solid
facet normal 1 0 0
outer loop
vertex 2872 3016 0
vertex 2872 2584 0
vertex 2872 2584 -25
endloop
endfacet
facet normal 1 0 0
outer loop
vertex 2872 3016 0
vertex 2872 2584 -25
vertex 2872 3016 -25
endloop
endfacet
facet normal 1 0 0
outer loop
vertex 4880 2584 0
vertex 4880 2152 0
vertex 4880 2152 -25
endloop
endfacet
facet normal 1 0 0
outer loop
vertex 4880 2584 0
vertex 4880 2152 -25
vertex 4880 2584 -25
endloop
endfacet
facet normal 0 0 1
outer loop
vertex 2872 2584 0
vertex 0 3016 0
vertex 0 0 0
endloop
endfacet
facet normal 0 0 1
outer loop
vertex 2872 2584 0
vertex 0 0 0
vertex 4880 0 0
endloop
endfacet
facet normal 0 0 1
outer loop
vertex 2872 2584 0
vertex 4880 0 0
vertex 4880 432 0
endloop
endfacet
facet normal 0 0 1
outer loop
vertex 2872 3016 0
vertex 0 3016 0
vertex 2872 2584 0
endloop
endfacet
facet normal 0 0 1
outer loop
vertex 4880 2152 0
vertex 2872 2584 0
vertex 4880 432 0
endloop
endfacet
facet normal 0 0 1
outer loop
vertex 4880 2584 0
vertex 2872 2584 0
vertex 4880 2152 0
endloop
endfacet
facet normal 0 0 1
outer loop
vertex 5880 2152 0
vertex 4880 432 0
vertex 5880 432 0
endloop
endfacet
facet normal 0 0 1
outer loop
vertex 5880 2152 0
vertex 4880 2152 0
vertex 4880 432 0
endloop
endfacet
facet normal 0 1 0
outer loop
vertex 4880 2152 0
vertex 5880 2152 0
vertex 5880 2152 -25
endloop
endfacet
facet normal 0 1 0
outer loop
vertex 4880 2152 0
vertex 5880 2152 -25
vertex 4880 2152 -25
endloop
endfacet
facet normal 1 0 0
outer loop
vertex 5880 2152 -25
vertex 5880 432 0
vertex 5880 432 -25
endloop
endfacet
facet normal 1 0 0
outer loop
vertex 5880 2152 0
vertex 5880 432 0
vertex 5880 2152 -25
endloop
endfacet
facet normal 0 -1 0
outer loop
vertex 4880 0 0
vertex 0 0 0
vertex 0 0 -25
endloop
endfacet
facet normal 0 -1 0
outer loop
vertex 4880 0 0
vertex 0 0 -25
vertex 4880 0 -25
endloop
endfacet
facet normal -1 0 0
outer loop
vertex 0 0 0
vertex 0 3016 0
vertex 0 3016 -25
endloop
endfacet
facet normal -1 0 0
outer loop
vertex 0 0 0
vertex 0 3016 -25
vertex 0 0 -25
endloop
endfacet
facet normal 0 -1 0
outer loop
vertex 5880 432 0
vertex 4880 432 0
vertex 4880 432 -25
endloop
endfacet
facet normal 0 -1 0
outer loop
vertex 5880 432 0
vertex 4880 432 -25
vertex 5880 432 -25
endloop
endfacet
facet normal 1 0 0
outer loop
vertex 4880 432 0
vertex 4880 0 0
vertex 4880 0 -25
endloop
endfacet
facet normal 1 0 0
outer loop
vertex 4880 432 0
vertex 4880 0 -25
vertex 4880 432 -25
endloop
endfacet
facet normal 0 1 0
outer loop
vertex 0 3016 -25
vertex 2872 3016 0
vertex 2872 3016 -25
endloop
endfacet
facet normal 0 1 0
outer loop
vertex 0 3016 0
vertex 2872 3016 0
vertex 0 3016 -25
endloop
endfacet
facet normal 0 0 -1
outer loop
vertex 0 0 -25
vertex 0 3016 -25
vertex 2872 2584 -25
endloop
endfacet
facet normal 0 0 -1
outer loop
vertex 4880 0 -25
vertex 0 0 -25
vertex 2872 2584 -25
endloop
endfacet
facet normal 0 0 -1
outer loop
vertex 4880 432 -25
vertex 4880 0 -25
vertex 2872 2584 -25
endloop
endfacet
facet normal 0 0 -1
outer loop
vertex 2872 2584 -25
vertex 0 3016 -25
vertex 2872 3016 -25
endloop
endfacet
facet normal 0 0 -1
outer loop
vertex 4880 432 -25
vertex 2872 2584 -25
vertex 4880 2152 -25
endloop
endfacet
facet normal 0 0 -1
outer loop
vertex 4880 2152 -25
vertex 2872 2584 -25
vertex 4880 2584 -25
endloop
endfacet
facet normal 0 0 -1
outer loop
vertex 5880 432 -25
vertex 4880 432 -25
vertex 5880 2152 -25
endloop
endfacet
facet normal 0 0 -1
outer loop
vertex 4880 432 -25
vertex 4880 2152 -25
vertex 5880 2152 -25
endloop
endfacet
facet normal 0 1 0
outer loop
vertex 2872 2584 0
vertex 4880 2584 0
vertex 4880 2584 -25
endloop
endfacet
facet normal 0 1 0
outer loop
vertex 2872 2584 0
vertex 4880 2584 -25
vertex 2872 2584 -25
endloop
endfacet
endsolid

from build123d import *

# Parameters (mm, degrees)
F1_DEPTH = 25


with BuildPart() as f1:
    # F0 (on Top) → F1 (new body)
    with BuildSketch(Plane.XY):
        Polygon((0, 3016), (0, 0), (4880, 0), (4880, 432), (5880, 432), (5880, 2152), (4880, 2152), (4880, 2584), (2872, 2584), (2872, 3016), align=None)
    extrude(amount=-F1_DEPTH)


solid = f1.part
